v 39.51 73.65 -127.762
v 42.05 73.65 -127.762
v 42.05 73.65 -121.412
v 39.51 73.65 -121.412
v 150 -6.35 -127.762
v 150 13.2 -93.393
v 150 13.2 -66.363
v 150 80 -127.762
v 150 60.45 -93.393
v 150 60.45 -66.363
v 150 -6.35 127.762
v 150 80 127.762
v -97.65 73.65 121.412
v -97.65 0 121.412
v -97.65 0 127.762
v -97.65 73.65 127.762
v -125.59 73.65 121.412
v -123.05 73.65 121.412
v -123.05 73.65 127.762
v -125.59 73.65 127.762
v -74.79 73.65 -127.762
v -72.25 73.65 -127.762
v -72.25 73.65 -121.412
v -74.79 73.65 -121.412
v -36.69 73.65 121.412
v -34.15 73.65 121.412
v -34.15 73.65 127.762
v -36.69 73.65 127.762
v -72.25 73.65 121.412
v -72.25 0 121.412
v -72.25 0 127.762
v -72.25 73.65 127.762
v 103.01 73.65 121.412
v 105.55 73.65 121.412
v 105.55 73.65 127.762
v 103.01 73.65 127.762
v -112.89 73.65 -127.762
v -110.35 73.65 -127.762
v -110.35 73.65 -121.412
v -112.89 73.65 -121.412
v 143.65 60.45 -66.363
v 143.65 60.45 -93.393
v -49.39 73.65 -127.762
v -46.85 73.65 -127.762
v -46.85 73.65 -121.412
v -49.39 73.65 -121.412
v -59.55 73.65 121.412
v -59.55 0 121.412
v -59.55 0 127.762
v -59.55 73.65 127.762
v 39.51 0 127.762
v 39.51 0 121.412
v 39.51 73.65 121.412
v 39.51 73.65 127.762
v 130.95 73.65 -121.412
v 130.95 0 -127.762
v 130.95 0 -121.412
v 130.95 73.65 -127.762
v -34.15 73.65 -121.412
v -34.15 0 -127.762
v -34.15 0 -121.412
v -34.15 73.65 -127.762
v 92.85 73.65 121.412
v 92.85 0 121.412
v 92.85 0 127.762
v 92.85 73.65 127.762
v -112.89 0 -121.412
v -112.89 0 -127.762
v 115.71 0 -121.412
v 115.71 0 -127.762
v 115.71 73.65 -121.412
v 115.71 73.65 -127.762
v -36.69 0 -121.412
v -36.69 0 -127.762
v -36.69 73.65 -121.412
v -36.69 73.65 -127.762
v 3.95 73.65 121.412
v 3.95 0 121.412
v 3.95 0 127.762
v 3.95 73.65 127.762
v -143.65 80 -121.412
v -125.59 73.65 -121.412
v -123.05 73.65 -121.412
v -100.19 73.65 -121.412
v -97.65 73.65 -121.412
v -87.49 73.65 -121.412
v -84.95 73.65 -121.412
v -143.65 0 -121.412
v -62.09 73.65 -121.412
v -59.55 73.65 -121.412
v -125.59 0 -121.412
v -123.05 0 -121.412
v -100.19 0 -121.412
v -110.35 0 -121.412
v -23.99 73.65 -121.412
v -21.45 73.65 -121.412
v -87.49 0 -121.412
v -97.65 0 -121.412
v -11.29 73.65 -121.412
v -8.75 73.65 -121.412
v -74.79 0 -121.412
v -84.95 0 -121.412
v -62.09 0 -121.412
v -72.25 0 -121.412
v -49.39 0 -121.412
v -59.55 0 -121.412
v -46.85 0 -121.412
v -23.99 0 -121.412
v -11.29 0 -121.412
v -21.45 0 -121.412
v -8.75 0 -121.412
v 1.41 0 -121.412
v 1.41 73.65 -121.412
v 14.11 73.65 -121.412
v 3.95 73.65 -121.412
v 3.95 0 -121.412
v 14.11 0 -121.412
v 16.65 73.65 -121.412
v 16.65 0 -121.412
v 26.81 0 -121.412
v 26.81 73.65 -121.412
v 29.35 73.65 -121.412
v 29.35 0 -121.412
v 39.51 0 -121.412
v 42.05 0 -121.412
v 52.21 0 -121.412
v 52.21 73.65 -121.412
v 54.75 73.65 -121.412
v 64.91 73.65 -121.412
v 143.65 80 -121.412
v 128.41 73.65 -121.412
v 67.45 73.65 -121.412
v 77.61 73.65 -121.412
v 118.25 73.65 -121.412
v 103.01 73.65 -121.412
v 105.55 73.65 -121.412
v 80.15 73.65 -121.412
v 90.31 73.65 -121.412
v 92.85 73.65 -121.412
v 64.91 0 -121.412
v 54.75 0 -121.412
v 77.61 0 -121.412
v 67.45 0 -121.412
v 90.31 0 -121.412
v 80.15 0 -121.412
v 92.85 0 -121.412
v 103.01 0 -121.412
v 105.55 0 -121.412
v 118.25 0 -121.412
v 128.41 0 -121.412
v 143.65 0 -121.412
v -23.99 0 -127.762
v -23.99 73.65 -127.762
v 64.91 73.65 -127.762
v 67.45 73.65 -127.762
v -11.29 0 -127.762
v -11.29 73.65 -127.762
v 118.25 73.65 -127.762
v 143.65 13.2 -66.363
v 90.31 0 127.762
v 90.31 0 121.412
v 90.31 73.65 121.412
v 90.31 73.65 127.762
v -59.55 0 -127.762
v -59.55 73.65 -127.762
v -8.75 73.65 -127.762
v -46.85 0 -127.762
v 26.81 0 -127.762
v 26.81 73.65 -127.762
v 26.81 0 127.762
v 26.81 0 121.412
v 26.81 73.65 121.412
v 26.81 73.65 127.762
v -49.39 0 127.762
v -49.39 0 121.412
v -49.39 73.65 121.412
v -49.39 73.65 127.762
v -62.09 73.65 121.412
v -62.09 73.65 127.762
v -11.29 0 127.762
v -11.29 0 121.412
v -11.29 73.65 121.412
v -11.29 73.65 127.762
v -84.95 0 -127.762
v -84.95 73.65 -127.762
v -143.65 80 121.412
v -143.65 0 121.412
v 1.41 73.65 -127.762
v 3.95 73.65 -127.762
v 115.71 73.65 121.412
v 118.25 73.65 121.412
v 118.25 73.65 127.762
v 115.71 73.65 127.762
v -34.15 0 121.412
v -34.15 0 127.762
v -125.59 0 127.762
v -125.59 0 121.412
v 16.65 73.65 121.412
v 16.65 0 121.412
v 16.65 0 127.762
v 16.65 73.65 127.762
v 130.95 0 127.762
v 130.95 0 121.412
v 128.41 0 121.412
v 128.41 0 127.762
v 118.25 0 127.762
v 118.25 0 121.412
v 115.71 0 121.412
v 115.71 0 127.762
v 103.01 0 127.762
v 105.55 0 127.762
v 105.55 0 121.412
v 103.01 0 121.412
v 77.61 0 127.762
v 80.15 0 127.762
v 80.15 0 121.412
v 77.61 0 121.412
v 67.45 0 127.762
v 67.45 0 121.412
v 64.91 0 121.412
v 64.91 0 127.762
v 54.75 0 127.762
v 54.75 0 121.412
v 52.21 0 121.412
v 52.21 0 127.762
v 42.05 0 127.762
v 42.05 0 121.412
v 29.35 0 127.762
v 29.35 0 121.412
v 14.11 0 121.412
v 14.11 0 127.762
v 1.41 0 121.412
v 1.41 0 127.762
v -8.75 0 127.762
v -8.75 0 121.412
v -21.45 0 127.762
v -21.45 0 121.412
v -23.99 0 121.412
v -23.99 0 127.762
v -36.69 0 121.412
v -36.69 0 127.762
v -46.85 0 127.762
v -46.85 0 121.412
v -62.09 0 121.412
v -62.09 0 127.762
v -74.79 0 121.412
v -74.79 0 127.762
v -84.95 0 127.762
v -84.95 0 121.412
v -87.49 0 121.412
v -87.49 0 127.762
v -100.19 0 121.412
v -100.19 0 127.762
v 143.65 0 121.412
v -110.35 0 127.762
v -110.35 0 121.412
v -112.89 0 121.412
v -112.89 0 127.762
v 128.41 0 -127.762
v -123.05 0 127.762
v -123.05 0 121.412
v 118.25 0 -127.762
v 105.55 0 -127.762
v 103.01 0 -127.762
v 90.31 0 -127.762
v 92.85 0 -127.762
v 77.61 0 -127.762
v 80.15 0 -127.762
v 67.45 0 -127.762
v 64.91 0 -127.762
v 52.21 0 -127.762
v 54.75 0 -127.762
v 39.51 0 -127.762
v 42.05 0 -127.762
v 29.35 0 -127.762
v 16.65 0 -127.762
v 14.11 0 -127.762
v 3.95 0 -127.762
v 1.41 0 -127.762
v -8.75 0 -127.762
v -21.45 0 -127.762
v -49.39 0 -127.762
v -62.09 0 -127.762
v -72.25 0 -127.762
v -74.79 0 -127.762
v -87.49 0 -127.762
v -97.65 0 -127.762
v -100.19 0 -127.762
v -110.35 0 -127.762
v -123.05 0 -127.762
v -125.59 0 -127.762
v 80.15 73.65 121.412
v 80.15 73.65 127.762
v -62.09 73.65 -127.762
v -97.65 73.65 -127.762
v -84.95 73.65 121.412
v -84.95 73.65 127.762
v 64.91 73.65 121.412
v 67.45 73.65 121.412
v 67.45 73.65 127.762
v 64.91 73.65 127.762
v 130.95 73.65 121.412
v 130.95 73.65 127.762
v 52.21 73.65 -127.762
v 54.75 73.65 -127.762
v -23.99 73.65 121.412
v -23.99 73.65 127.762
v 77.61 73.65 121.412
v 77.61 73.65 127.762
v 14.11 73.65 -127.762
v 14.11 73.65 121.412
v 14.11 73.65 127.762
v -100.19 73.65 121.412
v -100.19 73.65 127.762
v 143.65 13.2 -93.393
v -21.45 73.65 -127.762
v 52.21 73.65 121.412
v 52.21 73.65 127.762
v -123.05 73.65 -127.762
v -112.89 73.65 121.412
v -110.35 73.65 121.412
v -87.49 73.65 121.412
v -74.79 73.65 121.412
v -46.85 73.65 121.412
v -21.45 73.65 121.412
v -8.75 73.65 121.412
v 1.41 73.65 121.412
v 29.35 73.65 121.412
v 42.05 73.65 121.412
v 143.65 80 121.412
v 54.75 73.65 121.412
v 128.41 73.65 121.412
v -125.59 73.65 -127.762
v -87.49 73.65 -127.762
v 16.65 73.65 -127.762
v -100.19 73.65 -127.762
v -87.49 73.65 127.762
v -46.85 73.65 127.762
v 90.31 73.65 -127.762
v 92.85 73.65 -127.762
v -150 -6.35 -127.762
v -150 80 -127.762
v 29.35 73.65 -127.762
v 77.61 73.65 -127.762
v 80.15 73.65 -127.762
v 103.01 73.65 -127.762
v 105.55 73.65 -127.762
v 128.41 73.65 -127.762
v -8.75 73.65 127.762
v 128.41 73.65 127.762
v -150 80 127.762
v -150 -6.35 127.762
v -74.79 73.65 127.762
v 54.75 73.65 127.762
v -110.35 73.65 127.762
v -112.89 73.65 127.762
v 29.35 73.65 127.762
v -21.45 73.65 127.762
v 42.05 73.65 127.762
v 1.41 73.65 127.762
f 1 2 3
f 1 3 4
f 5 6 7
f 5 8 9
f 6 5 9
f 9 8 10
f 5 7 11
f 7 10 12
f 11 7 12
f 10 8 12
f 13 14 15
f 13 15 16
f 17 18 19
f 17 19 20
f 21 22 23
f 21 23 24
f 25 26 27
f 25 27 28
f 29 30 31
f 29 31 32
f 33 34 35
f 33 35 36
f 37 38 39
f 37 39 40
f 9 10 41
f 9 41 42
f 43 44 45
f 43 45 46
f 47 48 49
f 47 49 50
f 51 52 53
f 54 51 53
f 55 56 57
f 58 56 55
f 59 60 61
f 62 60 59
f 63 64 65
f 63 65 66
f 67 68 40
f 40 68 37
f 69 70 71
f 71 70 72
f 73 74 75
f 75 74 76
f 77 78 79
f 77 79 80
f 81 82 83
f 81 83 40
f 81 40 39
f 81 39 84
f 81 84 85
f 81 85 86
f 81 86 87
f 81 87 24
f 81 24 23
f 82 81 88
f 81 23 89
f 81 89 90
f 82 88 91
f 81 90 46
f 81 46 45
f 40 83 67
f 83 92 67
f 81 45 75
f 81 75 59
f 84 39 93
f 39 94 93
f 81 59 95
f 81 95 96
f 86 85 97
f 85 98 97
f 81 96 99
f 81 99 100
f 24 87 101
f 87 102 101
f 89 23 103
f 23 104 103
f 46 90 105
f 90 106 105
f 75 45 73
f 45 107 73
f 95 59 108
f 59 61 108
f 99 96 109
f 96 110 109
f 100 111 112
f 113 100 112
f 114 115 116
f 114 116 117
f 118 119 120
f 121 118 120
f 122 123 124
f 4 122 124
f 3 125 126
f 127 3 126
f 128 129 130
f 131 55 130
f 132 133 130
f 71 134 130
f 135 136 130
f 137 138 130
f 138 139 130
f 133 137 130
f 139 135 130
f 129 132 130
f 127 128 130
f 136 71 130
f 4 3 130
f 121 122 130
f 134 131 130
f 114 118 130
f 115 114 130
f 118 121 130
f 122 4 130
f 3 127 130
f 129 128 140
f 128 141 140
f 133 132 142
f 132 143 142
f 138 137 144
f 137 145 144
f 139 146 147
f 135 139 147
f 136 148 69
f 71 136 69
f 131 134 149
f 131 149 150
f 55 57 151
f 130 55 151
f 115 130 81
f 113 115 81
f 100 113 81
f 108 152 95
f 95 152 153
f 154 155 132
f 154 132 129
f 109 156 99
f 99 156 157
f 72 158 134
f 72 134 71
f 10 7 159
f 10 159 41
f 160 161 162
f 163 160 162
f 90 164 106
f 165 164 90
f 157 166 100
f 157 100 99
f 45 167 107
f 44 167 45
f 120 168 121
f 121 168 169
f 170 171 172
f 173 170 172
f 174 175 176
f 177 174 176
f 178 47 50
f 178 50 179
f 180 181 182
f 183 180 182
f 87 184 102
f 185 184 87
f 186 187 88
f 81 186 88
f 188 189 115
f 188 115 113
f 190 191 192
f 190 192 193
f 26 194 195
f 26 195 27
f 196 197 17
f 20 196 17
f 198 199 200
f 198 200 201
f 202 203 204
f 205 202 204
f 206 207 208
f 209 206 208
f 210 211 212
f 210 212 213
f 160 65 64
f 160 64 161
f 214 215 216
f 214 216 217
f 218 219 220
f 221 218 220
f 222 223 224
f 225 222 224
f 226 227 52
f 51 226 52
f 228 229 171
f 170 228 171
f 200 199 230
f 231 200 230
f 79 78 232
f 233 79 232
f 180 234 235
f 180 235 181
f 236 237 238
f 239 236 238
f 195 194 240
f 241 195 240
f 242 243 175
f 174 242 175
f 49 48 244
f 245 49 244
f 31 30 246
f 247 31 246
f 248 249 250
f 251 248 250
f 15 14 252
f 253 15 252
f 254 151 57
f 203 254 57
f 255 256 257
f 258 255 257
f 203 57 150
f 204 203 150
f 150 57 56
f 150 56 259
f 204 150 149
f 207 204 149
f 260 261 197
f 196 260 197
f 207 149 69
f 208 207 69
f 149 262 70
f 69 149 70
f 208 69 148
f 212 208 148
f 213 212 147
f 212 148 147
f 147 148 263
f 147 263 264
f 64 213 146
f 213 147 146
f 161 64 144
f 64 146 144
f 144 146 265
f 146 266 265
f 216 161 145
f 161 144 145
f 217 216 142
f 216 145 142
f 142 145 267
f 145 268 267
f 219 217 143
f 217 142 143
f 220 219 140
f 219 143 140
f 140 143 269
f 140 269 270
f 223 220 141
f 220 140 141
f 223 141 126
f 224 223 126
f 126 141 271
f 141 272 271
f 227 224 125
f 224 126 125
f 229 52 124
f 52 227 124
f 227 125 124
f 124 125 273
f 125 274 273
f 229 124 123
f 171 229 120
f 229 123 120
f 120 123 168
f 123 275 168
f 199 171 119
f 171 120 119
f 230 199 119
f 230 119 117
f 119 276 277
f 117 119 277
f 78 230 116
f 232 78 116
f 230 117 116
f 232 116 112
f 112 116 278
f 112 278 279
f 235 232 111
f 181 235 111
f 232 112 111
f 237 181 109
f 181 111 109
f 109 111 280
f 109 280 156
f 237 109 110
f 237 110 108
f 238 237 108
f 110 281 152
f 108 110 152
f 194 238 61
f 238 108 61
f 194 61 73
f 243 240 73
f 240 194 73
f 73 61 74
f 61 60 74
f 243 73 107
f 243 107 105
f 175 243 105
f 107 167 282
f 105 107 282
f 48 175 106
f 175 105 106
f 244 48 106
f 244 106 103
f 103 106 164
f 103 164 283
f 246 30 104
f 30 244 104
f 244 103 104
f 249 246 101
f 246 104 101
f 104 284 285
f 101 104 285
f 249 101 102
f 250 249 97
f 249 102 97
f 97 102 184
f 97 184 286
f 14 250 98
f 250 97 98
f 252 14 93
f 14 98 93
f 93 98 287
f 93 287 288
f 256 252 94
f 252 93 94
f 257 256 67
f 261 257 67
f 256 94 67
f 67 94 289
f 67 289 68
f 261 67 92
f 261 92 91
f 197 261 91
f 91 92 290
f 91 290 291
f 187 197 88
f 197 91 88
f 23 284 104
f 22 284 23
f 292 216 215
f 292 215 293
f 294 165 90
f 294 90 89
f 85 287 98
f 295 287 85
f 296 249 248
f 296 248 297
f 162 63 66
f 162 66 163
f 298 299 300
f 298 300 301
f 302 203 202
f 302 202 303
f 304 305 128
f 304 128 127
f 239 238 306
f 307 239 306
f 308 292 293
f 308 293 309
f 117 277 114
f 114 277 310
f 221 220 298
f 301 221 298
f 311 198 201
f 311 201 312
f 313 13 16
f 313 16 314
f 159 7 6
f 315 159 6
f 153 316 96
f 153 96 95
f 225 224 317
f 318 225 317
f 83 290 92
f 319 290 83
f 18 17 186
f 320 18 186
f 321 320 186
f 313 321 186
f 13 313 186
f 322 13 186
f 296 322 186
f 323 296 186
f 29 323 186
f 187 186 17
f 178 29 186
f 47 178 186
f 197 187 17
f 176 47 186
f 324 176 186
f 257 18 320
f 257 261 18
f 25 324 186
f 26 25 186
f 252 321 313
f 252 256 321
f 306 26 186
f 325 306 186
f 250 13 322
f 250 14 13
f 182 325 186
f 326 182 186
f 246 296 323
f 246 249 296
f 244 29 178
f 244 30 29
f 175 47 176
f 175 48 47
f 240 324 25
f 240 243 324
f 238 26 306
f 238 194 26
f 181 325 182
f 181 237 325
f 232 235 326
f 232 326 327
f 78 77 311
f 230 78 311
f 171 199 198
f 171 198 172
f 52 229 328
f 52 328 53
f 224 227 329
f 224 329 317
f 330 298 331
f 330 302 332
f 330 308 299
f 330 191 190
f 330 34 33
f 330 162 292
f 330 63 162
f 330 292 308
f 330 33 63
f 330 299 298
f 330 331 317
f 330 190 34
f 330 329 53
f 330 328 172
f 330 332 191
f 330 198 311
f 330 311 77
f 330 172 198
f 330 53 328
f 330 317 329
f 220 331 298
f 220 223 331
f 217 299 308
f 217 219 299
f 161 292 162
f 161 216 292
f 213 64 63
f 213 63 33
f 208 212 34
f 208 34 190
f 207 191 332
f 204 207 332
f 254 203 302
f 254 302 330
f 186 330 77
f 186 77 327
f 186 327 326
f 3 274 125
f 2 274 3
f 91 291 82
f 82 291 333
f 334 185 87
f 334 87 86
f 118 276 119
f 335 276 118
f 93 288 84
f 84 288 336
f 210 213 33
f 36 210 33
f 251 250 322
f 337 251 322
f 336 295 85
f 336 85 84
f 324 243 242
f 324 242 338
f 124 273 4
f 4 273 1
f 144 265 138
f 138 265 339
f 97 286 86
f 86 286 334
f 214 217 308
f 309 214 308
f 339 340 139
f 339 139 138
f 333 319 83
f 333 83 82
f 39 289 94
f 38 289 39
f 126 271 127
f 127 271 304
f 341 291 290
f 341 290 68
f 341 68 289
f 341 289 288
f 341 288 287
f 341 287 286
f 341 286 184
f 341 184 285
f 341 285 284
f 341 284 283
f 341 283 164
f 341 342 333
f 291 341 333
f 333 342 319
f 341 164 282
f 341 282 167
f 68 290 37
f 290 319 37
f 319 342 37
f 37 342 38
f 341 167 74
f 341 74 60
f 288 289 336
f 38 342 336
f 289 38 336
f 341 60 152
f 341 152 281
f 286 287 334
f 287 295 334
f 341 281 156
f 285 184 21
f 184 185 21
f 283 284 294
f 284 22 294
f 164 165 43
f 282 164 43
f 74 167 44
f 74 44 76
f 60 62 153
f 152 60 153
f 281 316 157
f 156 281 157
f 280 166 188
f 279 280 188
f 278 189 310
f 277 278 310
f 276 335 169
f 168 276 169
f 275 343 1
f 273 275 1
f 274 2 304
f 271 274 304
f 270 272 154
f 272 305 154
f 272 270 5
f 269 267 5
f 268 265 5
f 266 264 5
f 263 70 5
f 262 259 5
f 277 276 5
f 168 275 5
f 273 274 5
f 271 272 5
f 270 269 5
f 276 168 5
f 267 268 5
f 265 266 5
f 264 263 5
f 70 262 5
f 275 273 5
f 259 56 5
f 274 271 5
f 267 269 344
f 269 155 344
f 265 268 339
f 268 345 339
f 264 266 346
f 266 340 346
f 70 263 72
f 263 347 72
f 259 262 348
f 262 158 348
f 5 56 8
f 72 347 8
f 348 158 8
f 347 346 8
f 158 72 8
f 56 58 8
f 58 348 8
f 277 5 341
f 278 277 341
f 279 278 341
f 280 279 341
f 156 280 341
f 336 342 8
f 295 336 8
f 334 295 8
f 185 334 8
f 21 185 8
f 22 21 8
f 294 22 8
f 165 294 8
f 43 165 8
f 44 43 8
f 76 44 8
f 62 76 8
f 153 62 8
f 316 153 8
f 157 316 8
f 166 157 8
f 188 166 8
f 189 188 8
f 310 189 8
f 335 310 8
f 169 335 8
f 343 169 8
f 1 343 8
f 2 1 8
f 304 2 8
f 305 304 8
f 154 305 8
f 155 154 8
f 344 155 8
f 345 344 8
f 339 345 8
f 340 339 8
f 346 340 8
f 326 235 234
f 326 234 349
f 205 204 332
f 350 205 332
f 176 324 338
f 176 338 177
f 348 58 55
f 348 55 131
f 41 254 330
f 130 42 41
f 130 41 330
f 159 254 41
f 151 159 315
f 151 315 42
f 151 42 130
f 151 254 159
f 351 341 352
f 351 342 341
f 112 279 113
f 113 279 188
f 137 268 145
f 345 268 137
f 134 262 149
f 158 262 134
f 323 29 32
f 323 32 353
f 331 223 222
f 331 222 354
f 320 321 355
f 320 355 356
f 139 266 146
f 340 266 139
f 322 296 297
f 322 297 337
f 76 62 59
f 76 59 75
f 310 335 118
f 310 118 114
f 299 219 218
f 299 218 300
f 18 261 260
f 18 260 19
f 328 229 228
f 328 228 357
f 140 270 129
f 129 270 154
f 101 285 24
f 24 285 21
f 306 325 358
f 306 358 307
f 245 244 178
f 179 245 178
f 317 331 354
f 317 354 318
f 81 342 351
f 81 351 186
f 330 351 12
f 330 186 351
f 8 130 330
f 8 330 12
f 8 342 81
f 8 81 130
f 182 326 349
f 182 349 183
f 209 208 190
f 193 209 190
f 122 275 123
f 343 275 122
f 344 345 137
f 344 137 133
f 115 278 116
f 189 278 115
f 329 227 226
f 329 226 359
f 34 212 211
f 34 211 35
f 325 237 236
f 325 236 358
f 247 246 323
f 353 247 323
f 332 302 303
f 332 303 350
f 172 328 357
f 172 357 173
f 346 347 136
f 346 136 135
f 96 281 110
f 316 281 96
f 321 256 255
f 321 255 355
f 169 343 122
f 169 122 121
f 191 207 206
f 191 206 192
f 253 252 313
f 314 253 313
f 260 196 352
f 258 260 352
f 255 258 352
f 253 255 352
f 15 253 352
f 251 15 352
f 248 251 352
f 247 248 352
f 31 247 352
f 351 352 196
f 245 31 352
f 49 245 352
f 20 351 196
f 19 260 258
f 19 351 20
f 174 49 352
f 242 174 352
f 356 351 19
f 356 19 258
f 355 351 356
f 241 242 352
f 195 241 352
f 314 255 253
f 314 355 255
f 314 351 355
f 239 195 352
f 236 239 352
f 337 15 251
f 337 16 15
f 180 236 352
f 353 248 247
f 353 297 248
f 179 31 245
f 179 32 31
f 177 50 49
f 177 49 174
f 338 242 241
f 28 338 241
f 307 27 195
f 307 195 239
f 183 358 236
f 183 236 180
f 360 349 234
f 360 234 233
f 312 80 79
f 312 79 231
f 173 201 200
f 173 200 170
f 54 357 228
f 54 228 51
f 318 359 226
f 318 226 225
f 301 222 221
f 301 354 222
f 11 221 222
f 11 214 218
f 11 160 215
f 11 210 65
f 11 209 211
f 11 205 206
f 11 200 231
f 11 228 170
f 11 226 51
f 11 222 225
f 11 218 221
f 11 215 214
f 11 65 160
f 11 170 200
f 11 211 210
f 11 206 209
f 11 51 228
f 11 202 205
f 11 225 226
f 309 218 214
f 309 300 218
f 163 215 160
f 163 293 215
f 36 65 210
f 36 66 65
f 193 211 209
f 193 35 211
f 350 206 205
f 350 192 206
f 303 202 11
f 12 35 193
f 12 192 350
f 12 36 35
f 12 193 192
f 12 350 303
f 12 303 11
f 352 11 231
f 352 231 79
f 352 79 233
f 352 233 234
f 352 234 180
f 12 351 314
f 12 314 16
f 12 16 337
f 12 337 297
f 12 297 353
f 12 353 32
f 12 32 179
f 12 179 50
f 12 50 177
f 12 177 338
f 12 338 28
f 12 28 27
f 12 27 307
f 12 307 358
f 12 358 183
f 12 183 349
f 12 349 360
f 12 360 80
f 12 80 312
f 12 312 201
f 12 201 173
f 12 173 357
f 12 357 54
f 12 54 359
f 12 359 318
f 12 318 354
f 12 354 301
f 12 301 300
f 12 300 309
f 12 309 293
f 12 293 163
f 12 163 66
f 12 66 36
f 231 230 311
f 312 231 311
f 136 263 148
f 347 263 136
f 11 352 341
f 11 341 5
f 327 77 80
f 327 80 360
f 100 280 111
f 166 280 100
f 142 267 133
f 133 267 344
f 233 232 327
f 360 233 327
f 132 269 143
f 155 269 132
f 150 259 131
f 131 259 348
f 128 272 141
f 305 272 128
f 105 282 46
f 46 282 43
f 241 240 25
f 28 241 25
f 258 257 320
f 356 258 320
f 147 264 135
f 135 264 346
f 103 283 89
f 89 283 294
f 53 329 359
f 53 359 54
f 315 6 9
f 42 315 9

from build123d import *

# Parameters (mm, degrees)
SKETCH1_W           = 300
SKETCH1_H           = 255.524
SKETCH1_W_2         = 287.3
SKETCH1_H_2         = 242.824
BOSS_EXTRUDE1_DEPTH = 80
SKETCH2_W           = 300
SKETCH2_H           = 255.524
BOSS_EXTRUDE2_DEPTH = 6.35
SKETCH4_W           = 27.03
SKETCH4_H           = 47.25
CUT_EXTRUDE1_DEPTH  = 6.35
SKETCH5_W           = 2.54
SKETCH5_H           = 73.65
BOSS_EXTRUDE4_DEPTH = 324.866
LPATTERN2_COUNT     = 21
LPATTERN2_PITCH     = 12.7


with BuildPart() as part:
    # Sketch1 → Boss-Extrude1 (new body)
    with BuildSketch(Plane(origin=(0, 0, 0), x_dir=(1, 0, 0), z_dir=(0, 1, 0))):
        Rectangle(SKETCH1_W, SKETCH1_H)
        Rectangle(SKETCH1_W_2, SKETCH1_H_2, mode=Mode.SUBTRACT)
    extrude(amount=BOSS_EXTRUDE1_DEPTH)

    # Sketch2 → Boss-Extrude2 (add)
    with BuildSketch(Plane.XZ):
        Rectangle(SKETCH2_W, SKETCH2_H)
    extrude(amount=BOSS_EXTRUDE2_DEPTH)

    # Sketch4 → Cut-Extrude1 (cut)
    with BuildSketch(Plane(origin=(150, 0, 0), x_dir=(0, 0, -1), z_dir=(1, 0, 0))):
        with Locations((79.878215203, 36.825)):
            Rectangle(SKETCH4_W, SKETCH4_H)
    extrude(amount=-CUT_EXTRUDE1_DEPTH, mode=Mode.SUBTRACT)


with BuildPart() as body_2:
    # Sketch5 → Boss-Extrude4 (new body)
    with BuildSketch(Plane(origin=(0, 0, -127.762), x_dir=(-1, 0, 0), z_dir=(0, 0, -1))):
        with Locations((-129.68, 36.825)):
            Rectangle(SKETCH5_W, SKETCH5_H)
    boss_extrude4 = extrude(amount=-BOSS_EXTRUDE4_DEPTH)


with BuildPart() as lpattern2_1:
    # LPattern2: pattern copy
    add(boss_extrude4.moved(Location(Vector(-1, 0, 0) * (1 * LPATTERN2_PITCH))))


with BuildPart() as lpattern2_2:
    # LPattern2: pattern copy
    add(boss_extrude4.moved(Location(Vector(-1, 0, 0) * (2 * LPATTERN2_PITCH))))


with BuildPart() as lpattern2_3:
    # LPattern2: pattern copy
    add(boss_extrude4.moved(Location(Vector(-1, 0, 0) * (3 * LPATTERN2_PITCH))))


with BuildPart() as lpattern2_4:
    # LPattern2: pattern copy
    add(boss_extrude4.moved(Location(Vector(-1, 0, 0) * (4 * LPATTERN2_PITCH))))


with BuildPart() as lpattern2_5:
    # LPattern2: pattern copy
    add(boss_extrude4.moved(Location(Vector(-1, 0, 0) * (5 * LPATTERN2_PITCH))))


with BuildPart() as lpattern2_6:
    # LPattern2: pattern copy
    add(boss_extrude4.moved(Location(Vector(-1, 0, 0) * (6 * LPATTERN2_PITCH))))


with BuildPart() as lpattern2_7:
    # LPattern2: pattern copy
    add(boss_extrude4.moved(Location(Vector(-1, 0, 0) * (7 * LPATTERN2_PITCH))))


with BuildPart() as lpattern2_8:
    # LPattern2: pattern copy
    add(boss_extrude4.moved(Location(Vector(-1, 0, 0) * (8 * LPATTERN2_PITCH))))


with BuildPart() as lpattern2_9:
    # LPattern2: pattern copy
    add(boss_extrude4.moved(Location(Vector(-1, 0, 0) * (9 * LPATTERN2_PITCH))))


with BuildPart() as lpattern2_10:
    # LPattern2: pattern copy
    add(boss_extrude4.moved(Location(Vector(-1, 0, 0) * (10 * LPATTERN2_PITCH))))


with BuildPart() as lpattern2_11:
    # LPattern2: pattern copy
    add(boss_extrude4.moved(Location(Vector(-1, 0, 0) * (11 * LPATTERN2_PITCH))))


with BuildPart() as lpattern2_12:
    # LPattern2: pattern copy
    add(boss_extrude4.moved(Location(Vector(-1, 0, 0) * (12 * LPATTERN2_PITCH))))


with BuildPart() as lpattern2_13:
    # LPattern2: pattern copy
    add(boss_extrude4.moved(Location(Vector(-1, 0, 0) * (13 * LPATTERN2_PITCH))))


with BuildPart() as lpattern2_14:
    # LPattern2: pattern copy
    add(boss_extrude4.moved(Location(Vector(-1, 0, 0) * (14 * LPATTERN2_PITCH))))


with BuildPart() as lpattern2_15:
    # LPattern2: pattern copy
    add(boss_extrude4.moved(Location(Vector(-1, 0, 0) * (15 * LPATTERN2_PITCH))))


with BuildPart() as lpattern2_16:
    # LPattern2: pattern copy
    add(boss_extrude4.moved(Location(Vector(-1, 0, 0) * (16 * LPATTERN2_PITCH))))


with BuildPart() as lpattern2_17:
    # LPattern2: pattern copy
    add(boss_extrude4.moved(Location(Vector(-1, 0, 0) * (17 * LPATTERN2_PITCH))))


with BuildPart() as lpattern2_18:
    # LPattern2: pattern copy
    add(boss_extrude4.moved(Location(Vector(-1, 0, 0) * (18 * LPATTERN2_PITCH))))


with BuildPart() as lpattern2_19:
    # LPattern2: pattern copy
    add(boss_extrude4.moved(Location(Vector(-1, 0, 0) * (19 * LPATTERN2_PITCH))))


with BuildPart() as lpattern2_20:
    # LPattern2: pattern copy
    add(boss_extrude4.moved(Location(Vector(-1, 0, 0) * (20 * LPATTERN2_PITCH))))


with BuildPart() as part_1:
    add(part.part)

    # Combine2: cut LPattern2_11, body 2, LPattern2_1, LPattern2_2, LPattern2_4, LPattern2_3, LPattern2_5, LPattern2_6, LPattern2_7, LPattern2_8, LPattern2_10, LPattern2_9, LPattern2_12, LPattern2_13, LPattern2_15, LPattern2_16, LPattern2_19, LPattern2_20, LPattern2_18, LPattern2_17, LPattern2_14
    add(lpattern2_11.part, mode=Mode.SUBTRACT)
    add(body_2.part, mode=Mode.SUBTRACT)
    add(lpattern2_1.part, mode=Mode.SUBTRACT)
    add(lpattern2_2.part, mode=Mode.SUBTRACT)
    add(lpattern2_4.part, mode=Mode.SUBTRACT)
    add(lpattern2_3.part, mode=Mode.SUBTRACT)
    add(lpattern2_5.part, mode=Mode.SUBTRACT)
    add(lpattern2_6.part, mode=Mode.SUBTRACT)
    add(lpattern2_7.part, mode=Mode.SUBTRACT)
    add(lpattern2_8.part, mode=Mode.SUBTRACT)
    add(lpattern2_10.part, mode=Mode.SUBTRACT)
    add(lpattern2_9.part, mode=Mode.SUBTRACT)
    add(lpattern2_12.part, mode=Mode.SUBTRACT)
    add(lpattern2_13.part, mode=Mode.SUBTRACT)
    add(lpattern2_15.part, mode=Mode.SUBTRACT)
    add(lpattern2_16.part, mode=Mode.SUBTRACT)
    add(lpattern2_19.part, mode=Mode.SUBTRACT)
    add(lpattern2_20.part, mode=Mode.SUBTRACT)
    add(lpattern2_18.part, mode=Mode.SUBTRACT)
    add(lpattern2_17.part, mode=Mode.SUBTRACT)
    add(lpattern2_14.part, mode=Mode.SUBTRACT)


solid = part_1.part
